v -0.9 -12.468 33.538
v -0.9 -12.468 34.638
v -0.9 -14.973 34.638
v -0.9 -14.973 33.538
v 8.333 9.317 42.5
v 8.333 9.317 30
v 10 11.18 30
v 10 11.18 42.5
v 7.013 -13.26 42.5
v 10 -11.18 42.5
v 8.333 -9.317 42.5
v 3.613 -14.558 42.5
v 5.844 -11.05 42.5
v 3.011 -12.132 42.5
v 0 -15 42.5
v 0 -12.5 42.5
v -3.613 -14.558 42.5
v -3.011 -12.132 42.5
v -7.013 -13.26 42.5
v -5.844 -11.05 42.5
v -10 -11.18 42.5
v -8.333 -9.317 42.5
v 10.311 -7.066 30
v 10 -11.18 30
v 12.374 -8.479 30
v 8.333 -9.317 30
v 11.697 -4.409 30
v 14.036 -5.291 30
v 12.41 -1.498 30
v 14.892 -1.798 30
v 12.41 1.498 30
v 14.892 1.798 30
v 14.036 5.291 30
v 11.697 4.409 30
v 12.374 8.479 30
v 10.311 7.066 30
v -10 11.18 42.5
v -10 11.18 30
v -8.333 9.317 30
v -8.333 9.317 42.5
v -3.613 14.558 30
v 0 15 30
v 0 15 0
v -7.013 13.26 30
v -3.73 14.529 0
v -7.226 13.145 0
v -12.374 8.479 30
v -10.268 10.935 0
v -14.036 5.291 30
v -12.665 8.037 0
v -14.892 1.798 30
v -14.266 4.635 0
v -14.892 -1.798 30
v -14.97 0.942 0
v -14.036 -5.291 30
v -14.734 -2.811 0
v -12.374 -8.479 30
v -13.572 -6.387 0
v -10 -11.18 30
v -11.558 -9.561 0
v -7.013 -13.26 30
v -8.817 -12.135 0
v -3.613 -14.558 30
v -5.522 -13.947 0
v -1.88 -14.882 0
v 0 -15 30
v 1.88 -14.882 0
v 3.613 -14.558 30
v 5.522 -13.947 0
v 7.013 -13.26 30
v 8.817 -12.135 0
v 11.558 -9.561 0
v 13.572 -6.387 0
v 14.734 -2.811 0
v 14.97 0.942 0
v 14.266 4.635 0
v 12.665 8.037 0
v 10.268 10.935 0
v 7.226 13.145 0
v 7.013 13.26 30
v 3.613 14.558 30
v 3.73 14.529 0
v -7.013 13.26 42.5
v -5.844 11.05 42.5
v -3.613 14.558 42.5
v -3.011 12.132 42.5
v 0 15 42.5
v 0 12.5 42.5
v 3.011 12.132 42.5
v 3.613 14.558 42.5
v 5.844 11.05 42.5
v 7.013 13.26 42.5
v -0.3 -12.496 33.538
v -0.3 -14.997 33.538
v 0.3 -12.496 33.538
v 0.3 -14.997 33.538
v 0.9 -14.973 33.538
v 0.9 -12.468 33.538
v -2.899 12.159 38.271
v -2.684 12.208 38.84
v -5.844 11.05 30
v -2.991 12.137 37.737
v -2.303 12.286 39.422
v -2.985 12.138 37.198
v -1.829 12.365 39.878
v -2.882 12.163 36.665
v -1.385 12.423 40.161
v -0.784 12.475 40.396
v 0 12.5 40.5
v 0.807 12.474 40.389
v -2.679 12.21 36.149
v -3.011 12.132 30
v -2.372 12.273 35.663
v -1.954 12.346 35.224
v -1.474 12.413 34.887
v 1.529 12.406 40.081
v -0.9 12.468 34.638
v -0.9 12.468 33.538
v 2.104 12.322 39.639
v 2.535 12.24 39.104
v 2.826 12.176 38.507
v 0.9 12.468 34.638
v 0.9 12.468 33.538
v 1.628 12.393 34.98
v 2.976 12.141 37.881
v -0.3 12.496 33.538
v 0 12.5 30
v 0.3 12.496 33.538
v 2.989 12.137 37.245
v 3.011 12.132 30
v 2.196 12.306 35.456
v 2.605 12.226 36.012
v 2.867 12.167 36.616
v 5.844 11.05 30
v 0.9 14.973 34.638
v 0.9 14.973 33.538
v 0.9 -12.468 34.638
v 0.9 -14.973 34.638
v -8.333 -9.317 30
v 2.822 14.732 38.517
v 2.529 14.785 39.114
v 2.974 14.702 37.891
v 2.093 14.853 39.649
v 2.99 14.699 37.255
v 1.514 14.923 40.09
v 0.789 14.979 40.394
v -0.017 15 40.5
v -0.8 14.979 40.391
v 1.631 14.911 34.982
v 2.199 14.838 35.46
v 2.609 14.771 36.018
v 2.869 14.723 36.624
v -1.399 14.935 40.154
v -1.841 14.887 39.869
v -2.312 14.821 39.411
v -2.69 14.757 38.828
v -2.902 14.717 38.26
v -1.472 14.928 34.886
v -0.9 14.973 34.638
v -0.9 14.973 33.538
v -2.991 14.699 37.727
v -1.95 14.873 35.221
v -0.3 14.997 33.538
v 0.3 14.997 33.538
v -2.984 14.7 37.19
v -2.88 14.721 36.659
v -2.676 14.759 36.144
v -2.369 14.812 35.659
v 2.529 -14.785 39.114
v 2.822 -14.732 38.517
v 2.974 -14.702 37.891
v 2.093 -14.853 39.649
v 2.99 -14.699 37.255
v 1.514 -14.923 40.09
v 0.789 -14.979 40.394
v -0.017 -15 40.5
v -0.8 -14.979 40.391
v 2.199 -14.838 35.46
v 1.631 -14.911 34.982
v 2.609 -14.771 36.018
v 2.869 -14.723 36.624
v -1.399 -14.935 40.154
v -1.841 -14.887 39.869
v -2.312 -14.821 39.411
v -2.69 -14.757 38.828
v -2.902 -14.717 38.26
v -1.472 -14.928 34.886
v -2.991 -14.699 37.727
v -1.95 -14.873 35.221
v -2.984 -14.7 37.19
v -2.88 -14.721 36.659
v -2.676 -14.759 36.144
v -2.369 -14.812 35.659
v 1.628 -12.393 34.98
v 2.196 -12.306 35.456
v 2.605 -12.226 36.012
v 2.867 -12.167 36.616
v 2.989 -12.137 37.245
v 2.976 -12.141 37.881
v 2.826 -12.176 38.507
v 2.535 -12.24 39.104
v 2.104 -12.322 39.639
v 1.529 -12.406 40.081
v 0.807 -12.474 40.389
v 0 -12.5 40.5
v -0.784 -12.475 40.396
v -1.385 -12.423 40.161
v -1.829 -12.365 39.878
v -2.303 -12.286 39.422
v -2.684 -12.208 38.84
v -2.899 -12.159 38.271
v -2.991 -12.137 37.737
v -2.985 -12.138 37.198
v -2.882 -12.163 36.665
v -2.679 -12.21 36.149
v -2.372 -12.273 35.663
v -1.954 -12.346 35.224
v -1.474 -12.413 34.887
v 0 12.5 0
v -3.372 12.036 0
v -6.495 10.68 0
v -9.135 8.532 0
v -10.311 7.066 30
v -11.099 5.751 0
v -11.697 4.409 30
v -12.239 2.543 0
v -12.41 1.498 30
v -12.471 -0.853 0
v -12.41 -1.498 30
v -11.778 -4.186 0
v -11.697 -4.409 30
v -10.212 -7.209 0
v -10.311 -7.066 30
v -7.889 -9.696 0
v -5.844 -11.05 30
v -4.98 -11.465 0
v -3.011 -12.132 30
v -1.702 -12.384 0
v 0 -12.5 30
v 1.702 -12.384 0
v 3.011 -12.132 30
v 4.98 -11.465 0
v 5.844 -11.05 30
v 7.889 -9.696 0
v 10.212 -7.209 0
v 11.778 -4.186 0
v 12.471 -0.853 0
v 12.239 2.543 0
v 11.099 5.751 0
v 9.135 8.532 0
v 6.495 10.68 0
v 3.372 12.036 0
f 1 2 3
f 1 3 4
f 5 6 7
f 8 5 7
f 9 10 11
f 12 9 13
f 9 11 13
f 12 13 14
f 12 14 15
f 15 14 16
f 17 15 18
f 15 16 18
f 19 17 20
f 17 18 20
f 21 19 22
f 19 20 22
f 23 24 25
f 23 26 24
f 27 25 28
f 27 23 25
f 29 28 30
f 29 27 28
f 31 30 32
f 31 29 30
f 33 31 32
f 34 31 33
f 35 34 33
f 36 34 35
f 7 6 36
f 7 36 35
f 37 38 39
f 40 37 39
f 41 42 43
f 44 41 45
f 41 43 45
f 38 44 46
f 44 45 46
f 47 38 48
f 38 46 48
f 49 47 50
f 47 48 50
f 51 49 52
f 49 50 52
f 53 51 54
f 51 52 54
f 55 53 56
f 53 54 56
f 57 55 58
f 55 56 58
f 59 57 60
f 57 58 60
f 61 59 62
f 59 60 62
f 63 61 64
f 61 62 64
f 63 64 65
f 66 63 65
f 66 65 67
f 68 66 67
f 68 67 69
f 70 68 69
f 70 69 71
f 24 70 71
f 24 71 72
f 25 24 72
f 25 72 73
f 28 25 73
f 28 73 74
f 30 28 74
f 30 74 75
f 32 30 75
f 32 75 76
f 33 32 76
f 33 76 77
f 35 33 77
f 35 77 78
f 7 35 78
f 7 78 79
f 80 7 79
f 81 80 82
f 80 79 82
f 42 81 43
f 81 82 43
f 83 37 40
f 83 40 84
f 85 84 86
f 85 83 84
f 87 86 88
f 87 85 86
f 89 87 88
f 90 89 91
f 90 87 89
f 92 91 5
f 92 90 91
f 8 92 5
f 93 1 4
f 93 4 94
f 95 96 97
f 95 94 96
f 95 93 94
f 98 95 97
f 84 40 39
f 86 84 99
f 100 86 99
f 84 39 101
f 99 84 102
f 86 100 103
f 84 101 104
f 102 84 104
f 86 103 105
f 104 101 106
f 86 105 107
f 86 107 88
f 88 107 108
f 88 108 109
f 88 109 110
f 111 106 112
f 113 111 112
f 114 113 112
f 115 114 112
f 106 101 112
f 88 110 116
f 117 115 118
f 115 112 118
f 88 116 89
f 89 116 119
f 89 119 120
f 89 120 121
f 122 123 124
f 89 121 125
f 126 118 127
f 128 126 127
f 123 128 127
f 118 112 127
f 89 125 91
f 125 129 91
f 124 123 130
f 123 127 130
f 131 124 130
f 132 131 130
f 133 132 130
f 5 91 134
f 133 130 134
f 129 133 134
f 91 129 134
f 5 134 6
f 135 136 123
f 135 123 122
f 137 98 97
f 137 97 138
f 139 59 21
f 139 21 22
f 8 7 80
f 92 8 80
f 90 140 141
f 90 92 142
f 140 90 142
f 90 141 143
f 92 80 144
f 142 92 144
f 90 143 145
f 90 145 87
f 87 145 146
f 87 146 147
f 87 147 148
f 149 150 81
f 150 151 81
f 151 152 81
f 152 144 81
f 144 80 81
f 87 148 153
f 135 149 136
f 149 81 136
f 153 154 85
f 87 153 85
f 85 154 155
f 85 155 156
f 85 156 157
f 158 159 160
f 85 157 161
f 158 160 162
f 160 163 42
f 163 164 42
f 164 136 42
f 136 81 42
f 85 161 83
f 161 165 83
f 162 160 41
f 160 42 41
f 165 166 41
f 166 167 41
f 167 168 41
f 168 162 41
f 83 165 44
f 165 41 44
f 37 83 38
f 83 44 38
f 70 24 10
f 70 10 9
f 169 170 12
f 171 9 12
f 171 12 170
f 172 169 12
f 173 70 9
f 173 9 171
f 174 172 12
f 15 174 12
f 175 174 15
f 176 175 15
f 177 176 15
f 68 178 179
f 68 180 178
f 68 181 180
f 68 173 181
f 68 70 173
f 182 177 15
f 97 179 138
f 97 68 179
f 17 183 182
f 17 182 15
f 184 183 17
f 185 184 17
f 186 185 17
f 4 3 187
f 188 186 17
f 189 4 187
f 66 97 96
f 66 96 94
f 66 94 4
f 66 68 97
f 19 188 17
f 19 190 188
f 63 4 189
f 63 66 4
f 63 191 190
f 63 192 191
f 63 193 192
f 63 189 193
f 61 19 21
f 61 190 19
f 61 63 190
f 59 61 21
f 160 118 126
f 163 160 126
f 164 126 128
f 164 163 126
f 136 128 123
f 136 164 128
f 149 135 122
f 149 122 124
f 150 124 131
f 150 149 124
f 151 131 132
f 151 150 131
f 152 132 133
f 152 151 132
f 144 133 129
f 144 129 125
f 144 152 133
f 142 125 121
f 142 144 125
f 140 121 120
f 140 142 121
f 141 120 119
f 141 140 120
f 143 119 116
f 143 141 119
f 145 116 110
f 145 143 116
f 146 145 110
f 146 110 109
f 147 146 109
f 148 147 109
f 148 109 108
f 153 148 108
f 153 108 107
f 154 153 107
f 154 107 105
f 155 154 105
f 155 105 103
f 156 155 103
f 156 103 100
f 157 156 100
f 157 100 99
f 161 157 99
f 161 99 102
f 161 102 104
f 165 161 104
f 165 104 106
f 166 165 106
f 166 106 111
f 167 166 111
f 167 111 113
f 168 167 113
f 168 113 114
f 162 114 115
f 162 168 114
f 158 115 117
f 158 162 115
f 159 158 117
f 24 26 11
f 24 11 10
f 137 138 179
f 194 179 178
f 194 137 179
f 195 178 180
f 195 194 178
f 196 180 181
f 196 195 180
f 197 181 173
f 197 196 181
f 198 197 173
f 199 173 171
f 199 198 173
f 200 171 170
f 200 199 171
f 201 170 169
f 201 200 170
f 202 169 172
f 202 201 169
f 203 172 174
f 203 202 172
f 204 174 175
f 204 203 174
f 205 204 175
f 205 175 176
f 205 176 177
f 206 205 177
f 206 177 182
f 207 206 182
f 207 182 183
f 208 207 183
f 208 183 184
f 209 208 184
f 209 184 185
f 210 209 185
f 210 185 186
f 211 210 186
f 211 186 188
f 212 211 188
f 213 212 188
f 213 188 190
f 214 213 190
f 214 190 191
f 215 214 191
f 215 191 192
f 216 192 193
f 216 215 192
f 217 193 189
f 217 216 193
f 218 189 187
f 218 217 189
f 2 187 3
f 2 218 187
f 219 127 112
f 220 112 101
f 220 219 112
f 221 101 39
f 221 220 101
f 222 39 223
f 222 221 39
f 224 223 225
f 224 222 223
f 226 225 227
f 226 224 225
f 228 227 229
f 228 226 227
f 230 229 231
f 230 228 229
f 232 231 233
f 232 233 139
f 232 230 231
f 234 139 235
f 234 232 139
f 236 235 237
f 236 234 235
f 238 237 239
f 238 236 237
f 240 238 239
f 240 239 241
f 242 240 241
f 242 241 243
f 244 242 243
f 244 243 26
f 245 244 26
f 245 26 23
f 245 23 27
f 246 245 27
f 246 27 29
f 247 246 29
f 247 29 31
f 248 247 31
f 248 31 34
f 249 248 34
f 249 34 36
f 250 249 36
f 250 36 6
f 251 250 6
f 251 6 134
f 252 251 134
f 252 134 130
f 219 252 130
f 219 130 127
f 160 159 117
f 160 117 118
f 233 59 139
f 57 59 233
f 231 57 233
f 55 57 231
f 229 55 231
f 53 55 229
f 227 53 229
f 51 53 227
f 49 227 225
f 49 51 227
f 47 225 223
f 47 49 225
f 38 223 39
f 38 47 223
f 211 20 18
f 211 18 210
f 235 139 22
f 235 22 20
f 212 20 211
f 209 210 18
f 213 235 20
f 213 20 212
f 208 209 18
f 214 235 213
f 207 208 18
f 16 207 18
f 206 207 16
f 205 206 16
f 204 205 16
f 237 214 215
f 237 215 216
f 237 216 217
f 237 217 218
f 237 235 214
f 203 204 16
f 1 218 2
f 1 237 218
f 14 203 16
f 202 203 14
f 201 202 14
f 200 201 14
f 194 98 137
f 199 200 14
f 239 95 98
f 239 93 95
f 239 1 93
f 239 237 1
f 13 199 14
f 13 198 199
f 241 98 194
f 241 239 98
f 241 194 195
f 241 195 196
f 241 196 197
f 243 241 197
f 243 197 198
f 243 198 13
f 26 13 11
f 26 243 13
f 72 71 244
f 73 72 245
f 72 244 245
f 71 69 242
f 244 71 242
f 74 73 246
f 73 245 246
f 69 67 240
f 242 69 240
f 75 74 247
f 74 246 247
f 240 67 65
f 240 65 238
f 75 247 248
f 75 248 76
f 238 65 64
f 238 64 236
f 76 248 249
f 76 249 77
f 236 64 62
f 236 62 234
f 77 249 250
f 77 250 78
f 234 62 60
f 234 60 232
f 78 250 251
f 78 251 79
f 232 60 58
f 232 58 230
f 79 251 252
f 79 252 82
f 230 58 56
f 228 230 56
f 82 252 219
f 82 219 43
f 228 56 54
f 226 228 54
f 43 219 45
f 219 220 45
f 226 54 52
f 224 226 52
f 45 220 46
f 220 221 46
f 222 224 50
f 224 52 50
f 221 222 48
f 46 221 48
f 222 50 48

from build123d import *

# Parameters (mm, degrees)
SKETCH1_R           = 15
SKETCH1_R_2         = 12.5
BOSS_EXTRUDE1_DEPTH = 30
BOSS_EXTRUDE2_DEPTH = 12.5
CUT_EXTRUDE1_DEPTH  = 35


with BuildPart() as part:
    # Sketch1 → Boss-Extrude1 (new body)
    with BuildSketch(Plane(origin=(0, 0, 0), x_dir=(0, 1, 0), z_dir=(0, 0, 1))):
        Circle(SKETCH1_R)
        Circle(SKETCH1_R_2, mode=Mode.SUBTRACT)
    extrude(amount=BOSS_EXTRUDE1_DEPTH)

    # Sketch4 → Boss-Extrude2 (add)
    with BuildSketch(Plane.XY.offset(30)):
        with BuildLine():
            Line((-10, -11.180339887), (-8.333333333, -9.316949906))
            ThreePointArc((-8.333333333, -9.316949906), (0, -12.5), (8.333333333, -9.316949906))
            Line((8.333333333, -9.316949906), (10, -11.180339887))
            ThreePointArc((10, -11.180339887), (0, -15), (-10, -11.180339887))
        make_face()
        with BuildLine():
            Line((-10, 11.180339887), (-8.333333333, 9.316949906))
            ThreePointArc((-8.333333333, 9.316949906), (0, 12.5), (8.333333333, 9.316949906))
            Line((8.333333333, 9.316949906), (10, 11.180339887))
            ThreePointArc((10, 11.180339887), (0, 15), (-10, 11.180339887))
        make_face()
    extrude(amount=BOSS_EXTRUDE2_DEPTH)

    # Sketch6 → Cut-Extrude1 (cut)
    with BuildSketch(Plane(origin=(0, 15, 0), x_dir=(1, 0, 0), z_dir=(0, 1, 0))):
        with BuildLine():
            Line((-0.9, -34.638182396), (-0.9, -33.538182396))
            Line((-0.9, -33.538182396), (0.9, -33.538182396))
            Line((0.9, -33.538182396), (0.9, -34.638182396))
            ThreePointArc((0.9, -34.638182396), (0, -40.5), (-0.9, -34.638182396))
        make_face()
    extrude(amount=-CUT_EXTRUDE1_DEPTH, mode=Mode.SUBTRACT)


solid = part.part
